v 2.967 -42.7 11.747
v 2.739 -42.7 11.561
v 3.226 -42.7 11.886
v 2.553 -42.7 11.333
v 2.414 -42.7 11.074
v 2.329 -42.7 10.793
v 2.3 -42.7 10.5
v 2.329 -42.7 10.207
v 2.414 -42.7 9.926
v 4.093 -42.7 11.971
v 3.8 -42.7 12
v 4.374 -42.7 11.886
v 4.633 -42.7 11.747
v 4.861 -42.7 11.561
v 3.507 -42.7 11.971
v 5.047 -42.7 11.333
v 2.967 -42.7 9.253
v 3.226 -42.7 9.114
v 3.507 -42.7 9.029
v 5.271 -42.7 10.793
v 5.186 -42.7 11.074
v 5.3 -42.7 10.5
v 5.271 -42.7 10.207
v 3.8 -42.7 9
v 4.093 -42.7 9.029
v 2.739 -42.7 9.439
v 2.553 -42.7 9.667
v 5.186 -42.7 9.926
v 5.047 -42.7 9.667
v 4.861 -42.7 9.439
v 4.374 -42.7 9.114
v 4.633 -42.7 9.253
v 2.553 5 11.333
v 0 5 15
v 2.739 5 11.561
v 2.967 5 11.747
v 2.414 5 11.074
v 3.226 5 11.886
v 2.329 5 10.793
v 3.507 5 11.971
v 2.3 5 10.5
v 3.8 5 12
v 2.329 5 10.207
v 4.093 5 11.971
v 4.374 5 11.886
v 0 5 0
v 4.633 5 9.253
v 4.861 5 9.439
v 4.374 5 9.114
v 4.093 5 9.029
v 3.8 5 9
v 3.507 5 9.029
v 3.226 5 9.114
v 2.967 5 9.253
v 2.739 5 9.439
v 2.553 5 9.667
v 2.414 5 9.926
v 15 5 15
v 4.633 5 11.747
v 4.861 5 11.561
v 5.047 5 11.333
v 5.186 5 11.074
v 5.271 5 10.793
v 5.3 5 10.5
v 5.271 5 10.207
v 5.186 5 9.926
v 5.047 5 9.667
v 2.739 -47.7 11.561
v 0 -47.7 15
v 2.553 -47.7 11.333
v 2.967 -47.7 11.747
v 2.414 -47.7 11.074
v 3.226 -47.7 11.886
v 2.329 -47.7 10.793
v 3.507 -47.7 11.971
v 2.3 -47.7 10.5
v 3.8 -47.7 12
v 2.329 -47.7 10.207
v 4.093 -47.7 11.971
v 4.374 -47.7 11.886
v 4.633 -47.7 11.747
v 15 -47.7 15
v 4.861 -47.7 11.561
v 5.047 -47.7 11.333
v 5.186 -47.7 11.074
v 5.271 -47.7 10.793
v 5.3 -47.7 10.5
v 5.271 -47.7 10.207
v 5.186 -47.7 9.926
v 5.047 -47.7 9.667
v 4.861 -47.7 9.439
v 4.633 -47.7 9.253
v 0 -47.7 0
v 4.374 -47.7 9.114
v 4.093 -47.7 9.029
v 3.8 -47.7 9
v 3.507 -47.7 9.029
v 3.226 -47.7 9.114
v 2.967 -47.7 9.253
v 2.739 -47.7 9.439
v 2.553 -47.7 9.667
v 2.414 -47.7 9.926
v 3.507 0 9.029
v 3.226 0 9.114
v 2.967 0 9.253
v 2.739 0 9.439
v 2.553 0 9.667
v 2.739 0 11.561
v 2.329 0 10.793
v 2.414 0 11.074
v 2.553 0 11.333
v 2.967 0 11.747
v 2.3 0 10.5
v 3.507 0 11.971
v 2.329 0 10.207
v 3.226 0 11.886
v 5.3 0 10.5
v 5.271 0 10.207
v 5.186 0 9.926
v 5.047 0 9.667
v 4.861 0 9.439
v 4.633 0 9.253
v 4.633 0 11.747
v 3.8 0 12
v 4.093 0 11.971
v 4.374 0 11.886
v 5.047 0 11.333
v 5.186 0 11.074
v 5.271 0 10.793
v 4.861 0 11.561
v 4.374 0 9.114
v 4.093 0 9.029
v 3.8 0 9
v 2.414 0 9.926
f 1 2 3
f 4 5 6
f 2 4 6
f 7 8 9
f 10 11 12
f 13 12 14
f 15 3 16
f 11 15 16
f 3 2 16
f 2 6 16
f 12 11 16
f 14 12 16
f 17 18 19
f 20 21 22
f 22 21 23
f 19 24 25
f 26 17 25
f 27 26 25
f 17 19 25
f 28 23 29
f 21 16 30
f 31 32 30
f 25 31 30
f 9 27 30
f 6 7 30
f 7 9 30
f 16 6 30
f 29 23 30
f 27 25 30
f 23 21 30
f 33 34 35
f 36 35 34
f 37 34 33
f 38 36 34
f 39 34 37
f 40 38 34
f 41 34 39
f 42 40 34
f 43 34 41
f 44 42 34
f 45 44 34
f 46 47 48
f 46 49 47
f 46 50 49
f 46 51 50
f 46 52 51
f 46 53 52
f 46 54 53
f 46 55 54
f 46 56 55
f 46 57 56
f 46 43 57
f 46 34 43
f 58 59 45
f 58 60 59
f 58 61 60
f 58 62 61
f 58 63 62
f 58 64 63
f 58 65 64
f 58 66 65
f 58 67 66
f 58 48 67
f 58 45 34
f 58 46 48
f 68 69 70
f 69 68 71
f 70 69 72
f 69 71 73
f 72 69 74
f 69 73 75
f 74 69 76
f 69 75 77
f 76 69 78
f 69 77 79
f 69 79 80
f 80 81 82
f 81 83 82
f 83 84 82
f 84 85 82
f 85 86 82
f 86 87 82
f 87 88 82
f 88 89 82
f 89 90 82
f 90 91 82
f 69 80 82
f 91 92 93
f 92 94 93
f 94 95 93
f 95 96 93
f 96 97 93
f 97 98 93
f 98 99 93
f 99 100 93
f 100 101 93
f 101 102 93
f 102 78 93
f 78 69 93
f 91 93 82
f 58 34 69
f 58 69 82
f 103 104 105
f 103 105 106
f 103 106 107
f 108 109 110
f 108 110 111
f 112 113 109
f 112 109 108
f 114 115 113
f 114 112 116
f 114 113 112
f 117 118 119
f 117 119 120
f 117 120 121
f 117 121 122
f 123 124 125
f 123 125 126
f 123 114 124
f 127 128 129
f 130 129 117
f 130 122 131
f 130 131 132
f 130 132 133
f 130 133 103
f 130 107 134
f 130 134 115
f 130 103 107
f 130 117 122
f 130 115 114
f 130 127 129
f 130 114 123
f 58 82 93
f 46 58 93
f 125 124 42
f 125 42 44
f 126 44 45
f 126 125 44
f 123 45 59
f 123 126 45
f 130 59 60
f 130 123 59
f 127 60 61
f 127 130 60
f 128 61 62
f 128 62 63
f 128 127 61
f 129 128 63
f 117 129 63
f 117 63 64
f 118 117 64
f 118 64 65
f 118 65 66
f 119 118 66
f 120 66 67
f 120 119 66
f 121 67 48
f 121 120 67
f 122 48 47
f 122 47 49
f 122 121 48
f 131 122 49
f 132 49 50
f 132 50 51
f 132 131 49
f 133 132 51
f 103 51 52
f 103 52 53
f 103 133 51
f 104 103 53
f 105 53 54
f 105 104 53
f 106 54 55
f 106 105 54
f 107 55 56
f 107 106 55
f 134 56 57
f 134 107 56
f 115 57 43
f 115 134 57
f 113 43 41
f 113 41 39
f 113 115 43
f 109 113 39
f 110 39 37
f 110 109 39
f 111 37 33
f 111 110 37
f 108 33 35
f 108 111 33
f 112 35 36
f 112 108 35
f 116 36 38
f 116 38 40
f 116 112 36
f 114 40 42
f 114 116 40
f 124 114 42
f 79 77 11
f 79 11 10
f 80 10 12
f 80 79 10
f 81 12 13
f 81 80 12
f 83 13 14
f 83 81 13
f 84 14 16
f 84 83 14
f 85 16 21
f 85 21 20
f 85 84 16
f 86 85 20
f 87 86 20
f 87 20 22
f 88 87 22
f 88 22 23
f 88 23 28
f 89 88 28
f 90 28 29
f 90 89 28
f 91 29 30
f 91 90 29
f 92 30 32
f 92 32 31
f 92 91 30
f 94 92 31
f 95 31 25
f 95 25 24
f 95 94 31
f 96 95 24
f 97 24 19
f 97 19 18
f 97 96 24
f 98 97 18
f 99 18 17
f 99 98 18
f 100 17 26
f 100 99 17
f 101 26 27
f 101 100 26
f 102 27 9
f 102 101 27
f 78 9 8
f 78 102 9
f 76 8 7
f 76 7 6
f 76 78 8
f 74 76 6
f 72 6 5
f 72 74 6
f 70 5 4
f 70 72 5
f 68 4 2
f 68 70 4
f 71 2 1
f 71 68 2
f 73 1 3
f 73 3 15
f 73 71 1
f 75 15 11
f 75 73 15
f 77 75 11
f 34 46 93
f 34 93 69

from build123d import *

# Parameters (mm, degrees)
SKETCH1_R           = 1.5
BOSS_EXTRUDE1_DEPTH = 5
BOSS_EXTRUDE2_DEPTH = 42.7
BOSS_EXTRUDE3_START = -47.7
SKETCH1_4_R         = 1.5
BOSS_EXTRUDE3_DEPTH = 5


with BuildPart() as part:
    # Sketch1 → Boss-Extrude1 (new body)
    with BuildSketch(Plane(origin=(0, 0, 0), x_dir=(1, 0, 0), z_dir=(0, 1, 0))):
        Polygon((0, 0), (0, -15), (15, -15), align=None)
        with Locations((3.8, -10.5)):
            Circle(SKETCH1_R, mode=Mode.SUBTRACT)
    extrude(amount=BOSS_EXTRUDE1_DEPTH)

    # Sketch1<2> → Boss-Extrude2 (add)
    with BuildSketch(Plane(origin=(0, 0, 0), x_dir=(1, 0, 0), z_dir=(0, 1, 0))):
        Polygon((15, -15), (0, 0), (0, -15), align=None)
    extrude(amount=-BOSS_EXTRUDE2_DEPTH)

    # Sketch1<4> → Boss-Extrude3 (add)
    with BuildSketch(Plane(origin=(0, 0, 0), x_dir=(1, 0, 0), z_dir=(0, 1, 0)).offset(BOSS_EXTRUDE3_START)):
        Polygon((15, -15), (0, 0), (0, -15), align=None)
        with Locations((3.8, -10.5)):
            Circle(SKETCH1_4_R, mode=Mode.SUBTRACT)
    extrude(amount=BOSS_EXTRUDE3_DEPTH)


solid = part.part
